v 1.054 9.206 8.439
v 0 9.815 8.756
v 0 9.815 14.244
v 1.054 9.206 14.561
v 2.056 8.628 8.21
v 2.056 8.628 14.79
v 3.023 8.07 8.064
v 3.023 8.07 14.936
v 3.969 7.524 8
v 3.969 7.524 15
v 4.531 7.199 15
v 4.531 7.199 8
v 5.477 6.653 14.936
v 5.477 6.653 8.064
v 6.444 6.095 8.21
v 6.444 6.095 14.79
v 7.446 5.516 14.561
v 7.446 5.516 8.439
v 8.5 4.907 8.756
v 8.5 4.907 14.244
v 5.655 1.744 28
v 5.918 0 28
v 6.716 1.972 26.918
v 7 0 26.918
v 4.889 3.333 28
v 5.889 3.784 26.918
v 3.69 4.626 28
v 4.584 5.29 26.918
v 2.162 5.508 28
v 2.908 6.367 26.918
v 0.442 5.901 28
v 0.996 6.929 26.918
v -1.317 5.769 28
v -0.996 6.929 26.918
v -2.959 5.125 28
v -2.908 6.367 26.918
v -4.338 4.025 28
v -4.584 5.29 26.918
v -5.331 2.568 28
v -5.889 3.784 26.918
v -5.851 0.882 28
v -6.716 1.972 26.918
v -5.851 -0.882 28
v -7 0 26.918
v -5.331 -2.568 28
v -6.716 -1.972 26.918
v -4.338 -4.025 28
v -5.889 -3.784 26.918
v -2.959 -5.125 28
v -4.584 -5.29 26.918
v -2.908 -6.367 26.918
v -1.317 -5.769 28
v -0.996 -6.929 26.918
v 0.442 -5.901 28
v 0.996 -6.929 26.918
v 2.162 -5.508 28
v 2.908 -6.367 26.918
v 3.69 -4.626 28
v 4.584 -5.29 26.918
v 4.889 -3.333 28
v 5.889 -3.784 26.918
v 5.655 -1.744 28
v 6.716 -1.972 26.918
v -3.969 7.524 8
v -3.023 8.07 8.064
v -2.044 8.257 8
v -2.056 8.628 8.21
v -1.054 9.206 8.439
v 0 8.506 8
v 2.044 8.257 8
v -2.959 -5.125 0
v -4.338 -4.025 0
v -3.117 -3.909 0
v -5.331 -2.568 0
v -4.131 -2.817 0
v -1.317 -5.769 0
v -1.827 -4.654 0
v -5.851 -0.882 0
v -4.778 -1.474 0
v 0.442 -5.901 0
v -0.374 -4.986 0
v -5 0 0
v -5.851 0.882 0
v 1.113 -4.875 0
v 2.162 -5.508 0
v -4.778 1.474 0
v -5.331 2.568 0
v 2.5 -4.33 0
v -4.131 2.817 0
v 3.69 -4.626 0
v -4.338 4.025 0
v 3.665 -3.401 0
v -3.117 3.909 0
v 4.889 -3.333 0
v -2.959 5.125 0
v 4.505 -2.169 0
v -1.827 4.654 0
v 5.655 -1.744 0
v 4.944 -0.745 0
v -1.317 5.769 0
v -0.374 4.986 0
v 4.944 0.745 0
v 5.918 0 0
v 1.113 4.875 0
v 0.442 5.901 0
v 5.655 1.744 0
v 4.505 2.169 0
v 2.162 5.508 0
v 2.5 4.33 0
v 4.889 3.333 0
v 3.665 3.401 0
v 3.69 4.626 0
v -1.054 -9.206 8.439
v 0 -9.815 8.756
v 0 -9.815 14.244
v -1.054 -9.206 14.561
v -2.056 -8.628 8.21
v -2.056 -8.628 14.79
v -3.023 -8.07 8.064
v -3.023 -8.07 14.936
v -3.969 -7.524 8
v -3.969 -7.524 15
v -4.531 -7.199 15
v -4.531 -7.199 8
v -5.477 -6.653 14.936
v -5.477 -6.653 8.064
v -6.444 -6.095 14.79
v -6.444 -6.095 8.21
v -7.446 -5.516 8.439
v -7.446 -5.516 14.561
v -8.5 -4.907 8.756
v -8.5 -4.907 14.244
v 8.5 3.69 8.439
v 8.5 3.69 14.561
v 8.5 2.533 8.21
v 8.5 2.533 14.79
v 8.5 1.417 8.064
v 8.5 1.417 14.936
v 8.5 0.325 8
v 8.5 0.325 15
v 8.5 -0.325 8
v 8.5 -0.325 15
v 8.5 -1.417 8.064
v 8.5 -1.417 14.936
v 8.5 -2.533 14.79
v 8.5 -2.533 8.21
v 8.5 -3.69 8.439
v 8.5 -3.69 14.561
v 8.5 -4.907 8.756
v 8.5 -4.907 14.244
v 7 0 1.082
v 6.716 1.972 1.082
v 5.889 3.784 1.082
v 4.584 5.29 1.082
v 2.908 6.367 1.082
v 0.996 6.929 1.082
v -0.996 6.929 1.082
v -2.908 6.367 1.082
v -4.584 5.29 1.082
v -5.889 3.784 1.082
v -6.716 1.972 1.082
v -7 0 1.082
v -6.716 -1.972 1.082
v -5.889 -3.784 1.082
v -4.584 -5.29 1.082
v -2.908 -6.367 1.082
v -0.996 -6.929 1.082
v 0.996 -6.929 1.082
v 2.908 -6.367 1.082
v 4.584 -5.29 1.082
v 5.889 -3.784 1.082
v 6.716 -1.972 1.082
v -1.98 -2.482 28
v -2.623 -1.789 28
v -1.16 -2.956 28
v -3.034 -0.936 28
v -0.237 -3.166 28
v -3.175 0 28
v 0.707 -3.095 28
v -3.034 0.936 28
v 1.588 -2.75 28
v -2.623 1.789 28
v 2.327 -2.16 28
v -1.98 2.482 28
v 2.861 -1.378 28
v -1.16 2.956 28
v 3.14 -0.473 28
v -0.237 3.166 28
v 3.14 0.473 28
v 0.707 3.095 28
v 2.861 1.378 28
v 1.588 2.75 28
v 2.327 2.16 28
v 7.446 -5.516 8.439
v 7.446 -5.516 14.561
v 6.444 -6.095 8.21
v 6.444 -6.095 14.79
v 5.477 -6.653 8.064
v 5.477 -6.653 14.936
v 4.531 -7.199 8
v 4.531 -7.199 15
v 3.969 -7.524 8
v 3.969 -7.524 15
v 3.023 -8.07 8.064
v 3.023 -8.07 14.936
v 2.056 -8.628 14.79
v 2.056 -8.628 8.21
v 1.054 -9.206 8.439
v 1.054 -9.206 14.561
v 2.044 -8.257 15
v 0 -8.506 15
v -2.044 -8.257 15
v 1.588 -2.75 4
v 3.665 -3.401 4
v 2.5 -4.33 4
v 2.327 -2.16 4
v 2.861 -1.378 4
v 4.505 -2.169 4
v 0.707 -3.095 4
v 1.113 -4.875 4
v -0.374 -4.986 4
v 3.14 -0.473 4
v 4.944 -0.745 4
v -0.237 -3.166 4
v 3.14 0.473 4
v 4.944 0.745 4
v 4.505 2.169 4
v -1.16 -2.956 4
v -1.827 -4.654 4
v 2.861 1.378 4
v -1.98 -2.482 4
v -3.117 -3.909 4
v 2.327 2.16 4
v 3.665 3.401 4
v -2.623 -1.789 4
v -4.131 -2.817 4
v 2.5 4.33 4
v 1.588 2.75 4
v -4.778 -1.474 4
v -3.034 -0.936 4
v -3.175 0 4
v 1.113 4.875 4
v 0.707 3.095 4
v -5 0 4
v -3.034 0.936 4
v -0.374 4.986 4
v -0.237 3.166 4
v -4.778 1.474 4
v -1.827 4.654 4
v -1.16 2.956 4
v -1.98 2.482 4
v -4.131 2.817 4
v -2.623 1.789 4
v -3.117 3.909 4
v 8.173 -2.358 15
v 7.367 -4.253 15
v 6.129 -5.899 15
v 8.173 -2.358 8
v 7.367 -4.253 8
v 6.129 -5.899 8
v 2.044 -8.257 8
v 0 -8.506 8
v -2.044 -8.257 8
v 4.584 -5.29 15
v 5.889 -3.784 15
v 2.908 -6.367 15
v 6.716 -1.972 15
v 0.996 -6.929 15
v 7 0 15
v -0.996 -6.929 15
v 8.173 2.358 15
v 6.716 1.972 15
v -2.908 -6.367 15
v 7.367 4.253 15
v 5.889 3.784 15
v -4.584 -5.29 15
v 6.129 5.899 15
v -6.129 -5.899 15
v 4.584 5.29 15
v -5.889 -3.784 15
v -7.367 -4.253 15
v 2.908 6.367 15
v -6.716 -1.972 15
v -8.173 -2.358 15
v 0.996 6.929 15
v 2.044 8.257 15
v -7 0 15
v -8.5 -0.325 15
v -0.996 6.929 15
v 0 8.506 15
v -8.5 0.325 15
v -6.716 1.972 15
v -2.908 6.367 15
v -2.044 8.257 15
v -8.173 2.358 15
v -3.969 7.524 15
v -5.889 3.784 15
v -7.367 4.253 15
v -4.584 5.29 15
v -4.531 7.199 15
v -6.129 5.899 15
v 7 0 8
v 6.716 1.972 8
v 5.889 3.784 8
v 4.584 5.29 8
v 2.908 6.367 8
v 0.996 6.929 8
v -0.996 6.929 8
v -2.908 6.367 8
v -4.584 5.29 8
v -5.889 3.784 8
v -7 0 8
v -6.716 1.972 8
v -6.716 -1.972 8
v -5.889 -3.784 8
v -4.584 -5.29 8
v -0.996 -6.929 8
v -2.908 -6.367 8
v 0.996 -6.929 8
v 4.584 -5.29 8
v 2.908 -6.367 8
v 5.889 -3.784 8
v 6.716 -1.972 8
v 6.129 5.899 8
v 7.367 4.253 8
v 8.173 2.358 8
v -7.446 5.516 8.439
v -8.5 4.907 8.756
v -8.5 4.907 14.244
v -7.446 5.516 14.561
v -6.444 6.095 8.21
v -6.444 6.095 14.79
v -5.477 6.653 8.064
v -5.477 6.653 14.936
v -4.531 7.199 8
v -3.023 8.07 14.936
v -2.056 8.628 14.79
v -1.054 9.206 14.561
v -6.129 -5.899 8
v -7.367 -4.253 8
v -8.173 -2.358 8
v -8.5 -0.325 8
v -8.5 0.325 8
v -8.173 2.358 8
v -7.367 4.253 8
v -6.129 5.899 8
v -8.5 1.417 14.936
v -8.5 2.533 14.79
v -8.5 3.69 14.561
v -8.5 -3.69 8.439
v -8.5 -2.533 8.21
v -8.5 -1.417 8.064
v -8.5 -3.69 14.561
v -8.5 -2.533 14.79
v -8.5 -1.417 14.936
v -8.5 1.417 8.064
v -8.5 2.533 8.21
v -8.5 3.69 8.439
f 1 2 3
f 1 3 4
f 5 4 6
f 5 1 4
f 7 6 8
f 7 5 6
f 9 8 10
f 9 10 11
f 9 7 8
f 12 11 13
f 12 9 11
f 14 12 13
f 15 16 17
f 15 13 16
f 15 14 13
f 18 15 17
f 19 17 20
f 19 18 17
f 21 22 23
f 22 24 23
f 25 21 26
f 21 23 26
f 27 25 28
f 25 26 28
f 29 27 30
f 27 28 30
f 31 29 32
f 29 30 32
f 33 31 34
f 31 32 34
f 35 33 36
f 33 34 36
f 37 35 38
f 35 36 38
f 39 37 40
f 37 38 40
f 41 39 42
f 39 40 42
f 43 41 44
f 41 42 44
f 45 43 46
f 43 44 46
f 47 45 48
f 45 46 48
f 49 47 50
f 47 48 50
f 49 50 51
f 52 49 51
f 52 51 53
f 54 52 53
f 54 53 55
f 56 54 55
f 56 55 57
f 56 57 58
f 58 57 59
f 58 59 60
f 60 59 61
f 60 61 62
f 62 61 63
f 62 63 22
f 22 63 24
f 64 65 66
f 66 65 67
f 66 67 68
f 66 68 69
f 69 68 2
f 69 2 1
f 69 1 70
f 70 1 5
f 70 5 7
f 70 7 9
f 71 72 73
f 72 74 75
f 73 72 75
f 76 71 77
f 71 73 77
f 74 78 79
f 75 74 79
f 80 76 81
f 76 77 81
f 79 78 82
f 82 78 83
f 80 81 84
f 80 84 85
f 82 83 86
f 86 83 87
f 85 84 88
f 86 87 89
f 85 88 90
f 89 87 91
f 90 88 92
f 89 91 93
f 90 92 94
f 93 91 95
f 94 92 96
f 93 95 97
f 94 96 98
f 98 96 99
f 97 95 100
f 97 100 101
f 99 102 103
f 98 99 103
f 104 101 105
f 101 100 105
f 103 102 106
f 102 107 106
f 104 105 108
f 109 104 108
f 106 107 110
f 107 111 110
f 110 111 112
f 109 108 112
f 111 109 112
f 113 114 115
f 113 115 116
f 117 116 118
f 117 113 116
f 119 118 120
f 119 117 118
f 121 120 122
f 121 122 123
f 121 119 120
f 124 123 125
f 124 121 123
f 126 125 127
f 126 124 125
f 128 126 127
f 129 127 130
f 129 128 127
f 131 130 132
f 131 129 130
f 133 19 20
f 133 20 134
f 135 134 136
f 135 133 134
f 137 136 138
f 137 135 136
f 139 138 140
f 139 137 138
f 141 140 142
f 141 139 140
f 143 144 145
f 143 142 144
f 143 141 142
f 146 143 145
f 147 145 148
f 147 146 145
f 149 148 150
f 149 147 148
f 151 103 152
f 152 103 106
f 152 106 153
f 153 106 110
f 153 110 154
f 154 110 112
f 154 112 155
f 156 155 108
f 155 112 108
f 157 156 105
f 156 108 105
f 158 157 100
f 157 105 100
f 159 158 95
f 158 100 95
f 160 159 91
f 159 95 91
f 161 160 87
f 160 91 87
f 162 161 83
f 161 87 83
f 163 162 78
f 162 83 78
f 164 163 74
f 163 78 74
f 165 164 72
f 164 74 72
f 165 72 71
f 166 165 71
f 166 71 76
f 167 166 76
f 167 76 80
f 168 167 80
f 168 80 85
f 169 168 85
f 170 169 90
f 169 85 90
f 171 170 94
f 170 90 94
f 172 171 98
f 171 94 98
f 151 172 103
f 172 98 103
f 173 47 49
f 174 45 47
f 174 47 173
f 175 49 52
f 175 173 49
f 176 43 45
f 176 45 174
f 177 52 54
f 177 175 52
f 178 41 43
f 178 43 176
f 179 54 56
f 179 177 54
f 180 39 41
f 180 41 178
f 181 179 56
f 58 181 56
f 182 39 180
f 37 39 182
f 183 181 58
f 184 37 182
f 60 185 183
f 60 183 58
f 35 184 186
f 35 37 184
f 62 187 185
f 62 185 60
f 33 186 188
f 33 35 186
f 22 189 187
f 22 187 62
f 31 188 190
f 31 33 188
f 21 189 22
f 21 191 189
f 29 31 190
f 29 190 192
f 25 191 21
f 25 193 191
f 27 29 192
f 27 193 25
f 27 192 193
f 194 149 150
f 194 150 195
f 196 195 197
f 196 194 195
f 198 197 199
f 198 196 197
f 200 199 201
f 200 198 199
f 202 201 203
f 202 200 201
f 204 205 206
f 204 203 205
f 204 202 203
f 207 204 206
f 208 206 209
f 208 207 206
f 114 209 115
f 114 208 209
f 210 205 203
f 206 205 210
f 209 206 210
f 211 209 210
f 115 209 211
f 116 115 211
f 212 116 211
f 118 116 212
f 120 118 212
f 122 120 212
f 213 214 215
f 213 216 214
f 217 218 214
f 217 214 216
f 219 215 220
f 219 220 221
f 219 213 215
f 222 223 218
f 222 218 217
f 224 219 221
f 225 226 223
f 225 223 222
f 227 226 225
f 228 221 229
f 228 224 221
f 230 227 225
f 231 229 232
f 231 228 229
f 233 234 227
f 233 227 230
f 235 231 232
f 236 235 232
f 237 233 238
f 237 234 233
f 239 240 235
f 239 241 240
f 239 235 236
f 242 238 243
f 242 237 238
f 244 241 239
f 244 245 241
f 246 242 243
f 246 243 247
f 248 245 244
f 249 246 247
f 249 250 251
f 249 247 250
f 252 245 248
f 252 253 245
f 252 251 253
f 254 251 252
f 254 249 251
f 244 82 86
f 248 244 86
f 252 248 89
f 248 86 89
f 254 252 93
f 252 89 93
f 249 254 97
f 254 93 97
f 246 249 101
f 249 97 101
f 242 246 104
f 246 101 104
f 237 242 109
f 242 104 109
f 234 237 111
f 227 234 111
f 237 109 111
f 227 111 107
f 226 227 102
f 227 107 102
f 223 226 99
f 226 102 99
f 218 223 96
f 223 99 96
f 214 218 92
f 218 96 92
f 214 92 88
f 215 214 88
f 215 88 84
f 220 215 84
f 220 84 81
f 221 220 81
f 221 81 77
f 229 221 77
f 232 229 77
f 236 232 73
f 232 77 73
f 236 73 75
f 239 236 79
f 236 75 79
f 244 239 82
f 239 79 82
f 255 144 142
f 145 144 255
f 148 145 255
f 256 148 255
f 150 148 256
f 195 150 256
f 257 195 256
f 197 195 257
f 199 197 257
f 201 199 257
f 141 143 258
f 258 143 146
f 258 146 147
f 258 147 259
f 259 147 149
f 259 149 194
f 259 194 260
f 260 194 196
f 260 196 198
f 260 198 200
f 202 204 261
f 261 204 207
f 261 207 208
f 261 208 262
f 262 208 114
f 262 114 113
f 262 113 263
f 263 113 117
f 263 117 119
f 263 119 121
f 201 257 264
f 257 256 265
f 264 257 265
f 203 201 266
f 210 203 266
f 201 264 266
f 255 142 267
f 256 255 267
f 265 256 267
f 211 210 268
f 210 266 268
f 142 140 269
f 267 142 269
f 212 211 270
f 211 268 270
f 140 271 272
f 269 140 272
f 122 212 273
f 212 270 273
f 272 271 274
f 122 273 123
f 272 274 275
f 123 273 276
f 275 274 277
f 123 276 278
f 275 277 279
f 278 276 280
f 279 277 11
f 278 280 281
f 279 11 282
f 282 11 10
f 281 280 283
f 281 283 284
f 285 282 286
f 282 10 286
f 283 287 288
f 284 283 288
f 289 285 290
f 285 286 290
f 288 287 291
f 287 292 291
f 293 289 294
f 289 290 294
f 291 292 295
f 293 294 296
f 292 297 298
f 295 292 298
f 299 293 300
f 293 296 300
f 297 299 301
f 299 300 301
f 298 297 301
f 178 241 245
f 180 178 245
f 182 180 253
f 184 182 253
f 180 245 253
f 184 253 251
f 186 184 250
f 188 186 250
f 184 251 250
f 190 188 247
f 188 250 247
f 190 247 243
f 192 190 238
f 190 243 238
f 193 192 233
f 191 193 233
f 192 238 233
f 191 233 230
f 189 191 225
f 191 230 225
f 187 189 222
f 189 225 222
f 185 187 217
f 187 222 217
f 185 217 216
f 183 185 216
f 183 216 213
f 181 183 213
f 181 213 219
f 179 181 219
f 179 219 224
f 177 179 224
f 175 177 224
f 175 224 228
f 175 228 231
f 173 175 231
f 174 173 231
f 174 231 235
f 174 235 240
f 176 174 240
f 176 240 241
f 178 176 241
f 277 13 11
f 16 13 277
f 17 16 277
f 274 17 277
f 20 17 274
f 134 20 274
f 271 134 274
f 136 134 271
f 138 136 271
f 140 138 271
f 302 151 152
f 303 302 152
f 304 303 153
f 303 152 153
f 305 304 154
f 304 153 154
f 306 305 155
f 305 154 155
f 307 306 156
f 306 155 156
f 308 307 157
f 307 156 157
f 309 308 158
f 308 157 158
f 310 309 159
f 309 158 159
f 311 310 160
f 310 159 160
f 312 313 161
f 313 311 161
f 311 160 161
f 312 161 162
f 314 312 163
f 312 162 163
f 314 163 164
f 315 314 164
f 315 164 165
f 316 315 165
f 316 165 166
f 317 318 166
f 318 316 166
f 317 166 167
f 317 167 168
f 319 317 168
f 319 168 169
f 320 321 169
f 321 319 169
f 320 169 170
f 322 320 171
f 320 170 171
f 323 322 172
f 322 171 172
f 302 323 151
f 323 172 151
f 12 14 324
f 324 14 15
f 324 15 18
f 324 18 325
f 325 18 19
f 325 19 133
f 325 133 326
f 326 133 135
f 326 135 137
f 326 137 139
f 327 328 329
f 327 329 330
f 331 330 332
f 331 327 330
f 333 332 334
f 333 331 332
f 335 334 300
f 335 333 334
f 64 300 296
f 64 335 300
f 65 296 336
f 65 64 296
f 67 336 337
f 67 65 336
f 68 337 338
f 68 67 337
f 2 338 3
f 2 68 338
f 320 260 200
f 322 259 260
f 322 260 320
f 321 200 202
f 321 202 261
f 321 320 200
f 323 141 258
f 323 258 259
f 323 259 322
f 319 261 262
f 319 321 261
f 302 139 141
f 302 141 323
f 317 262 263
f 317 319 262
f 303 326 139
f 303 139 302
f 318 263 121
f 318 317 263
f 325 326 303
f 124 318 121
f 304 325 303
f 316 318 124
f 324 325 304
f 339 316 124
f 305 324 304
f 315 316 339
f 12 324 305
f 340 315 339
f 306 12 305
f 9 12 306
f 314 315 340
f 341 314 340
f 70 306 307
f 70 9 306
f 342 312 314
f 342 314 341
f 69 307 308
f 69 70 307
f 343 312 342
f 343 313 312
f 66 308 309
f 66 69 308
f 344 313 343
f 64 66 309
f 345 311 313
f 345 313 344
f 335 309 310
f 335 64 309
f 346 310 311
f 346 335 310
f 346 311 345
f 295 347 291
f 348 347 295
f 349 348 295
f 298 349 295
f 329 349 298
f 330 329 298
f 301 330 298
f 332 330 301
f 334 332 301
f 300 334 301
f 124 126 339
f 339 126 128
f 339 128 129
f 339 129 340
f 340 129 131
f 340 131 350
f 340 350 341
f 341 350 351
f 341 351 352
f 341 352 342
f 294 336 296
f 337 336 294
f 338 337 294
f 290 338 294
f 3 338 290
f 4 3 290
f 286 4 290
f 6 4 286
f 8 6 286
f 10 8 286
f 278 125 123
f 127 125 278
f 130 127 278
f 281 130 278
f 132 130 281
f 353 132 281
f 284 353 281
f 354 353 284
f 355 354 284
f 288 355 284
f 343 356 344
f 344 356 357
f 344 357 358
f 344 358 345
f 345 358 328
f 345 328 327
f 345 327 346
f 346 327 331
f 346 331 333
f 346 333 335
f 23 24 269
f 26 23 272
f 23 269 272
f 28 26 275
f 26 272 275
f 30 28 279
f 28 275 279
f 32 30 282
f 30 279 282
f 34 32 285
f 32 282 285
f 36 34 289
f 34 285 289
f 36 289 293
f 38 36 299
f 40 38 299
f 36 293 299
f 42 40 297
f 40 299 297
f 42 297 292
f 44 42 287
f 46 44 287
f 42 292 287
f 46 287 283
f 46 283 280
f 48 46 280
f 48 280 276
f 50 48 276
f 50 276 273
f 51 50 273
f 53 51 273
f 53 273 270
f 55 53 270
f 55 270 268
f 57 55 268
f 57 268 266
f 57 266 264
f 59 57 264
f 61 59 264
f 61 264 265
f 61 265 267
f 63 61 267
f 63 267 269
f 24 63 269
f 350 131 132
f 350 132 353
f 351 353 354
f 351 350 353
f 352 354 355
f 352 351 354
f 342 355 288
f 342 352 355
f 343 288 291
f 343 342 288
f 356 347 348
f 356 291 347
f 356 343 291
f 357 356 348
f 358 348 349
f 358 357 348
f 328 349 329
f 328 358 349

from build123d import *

# Parameters (mm, degrees)
SKETCH_1_R          = 7
EXTRUDE_1_DEPTH     = 28
EXTRUDE_START       = -8
EXTRUDE_2_DEPTH     = 7
SKETCH_6_R          = 5
CUT_EXTRUDE_1_DEPTH = 4
SKETCH_7_R          = 3.175
CUT_EXTRUDE_2_DEPTH = 28.287054318


# Read off the part's stored shape, not the designer's step: M14 机械螺纹 螺柱1, M14 机械螺纹 螺柱2
with BuildPart() as part:
    # 草图1 → 凸台-拉伸1 (new body)
    with BuildSketch(Plane.XY):
        Circle(SKETCH_1_R)
    extrude(amount=EXTRUDE_1_DEPTH)

    # M14 机械螺纹 螺柱1 outline → M14 机械螺纹 螺柱1 (revolve, cut)
    with BuildSketch(Plane.XZ):
        Polygon((7, 28), (5.9175, 28), (7, 26.9175), align=None)
    revolve(axis=Axis((0, 0, 0), (0, 0, 1)), mode=Mode.SUBTRACT)

    # M14 机械螺纹 螺柱2 outline → M14 机械螺纹 螺柱2 (revolve, cut)
    with BuildSketch(Plane.XZ):
        Polygon((7, 1.0825), (5.9175, 0), (7, 0), align=None)
    revolve(axis=Axis((0, 0, 0), (0, 0, 1)), mode=Mode.SUBTRACT)

    # 草图4 → 凸台-拉伸2 (add)
    with BuildSketch(Plane(origin=(0, 0, 0), x_dir=(-1, 0, 0), z_dir=(0, 0, -1)).offset(EXTRUDE_START)):
        Polygon((0, 9.814954576), (-8.5, 4.907477288), (-8.5, -4.907477288), (0, -9.814954576), (8.5, -4.907477288), (8.5, 4.907477288), align=None)
    extrude(amount=-EXTRUDE_2_DEPTH)

    # 草图5 → 切除-旋转1 (revolve, cut)
    with BuildSketch(Plane(origin=(0, 0, 0), x_dir=(0, 0, -1), z_dir=(1, 0, 0)), mode=Mode.PRIVATE) as cut_revolve_1_sk:
        Polygon((-8, 8.50620211), (-8.755608589, 9.814954576), (-8, 9.814954576), align=None)
        Polygon((-15, 8.50620211), (-14.244391411, 9.814954576), (-15, 9.814954576), align=None)
    revolve(cut_revolve_1_sk.sketch.rotate(Axis((0, 0, 0), (0, 0, -1)), 270), axis=Axis((0, 0, 0), (0, 0, -1)), mode=Mode.SUBTRACT)

    # 草图6 → 切除-拉伸1 (cut)
    with BuildSketch(Plane(origin=(0, 0, 0), x_dir=(-1, 0, 0), z_dir=(0, 0, -1))):
        Circle(SKETCH_6_R)
    extrude(amount=-CUT_EXTRUDE_1_DEPTH, mode=Mode.SUBTRACT)

    # 草图7 → 切除-拉伸2 (cut, through all)
    with BuildSketch(Plane(origin=(0, 0, 4), x_dir=(-1, 0, 0), z_dir=(0, 0, -1))):
        Circle(SKETCH_7_R)
    extrude(amount=-CUT_EXTRUDE_2_DEPTH, mode=Mode.SUBTRACT)


solid = part.part
